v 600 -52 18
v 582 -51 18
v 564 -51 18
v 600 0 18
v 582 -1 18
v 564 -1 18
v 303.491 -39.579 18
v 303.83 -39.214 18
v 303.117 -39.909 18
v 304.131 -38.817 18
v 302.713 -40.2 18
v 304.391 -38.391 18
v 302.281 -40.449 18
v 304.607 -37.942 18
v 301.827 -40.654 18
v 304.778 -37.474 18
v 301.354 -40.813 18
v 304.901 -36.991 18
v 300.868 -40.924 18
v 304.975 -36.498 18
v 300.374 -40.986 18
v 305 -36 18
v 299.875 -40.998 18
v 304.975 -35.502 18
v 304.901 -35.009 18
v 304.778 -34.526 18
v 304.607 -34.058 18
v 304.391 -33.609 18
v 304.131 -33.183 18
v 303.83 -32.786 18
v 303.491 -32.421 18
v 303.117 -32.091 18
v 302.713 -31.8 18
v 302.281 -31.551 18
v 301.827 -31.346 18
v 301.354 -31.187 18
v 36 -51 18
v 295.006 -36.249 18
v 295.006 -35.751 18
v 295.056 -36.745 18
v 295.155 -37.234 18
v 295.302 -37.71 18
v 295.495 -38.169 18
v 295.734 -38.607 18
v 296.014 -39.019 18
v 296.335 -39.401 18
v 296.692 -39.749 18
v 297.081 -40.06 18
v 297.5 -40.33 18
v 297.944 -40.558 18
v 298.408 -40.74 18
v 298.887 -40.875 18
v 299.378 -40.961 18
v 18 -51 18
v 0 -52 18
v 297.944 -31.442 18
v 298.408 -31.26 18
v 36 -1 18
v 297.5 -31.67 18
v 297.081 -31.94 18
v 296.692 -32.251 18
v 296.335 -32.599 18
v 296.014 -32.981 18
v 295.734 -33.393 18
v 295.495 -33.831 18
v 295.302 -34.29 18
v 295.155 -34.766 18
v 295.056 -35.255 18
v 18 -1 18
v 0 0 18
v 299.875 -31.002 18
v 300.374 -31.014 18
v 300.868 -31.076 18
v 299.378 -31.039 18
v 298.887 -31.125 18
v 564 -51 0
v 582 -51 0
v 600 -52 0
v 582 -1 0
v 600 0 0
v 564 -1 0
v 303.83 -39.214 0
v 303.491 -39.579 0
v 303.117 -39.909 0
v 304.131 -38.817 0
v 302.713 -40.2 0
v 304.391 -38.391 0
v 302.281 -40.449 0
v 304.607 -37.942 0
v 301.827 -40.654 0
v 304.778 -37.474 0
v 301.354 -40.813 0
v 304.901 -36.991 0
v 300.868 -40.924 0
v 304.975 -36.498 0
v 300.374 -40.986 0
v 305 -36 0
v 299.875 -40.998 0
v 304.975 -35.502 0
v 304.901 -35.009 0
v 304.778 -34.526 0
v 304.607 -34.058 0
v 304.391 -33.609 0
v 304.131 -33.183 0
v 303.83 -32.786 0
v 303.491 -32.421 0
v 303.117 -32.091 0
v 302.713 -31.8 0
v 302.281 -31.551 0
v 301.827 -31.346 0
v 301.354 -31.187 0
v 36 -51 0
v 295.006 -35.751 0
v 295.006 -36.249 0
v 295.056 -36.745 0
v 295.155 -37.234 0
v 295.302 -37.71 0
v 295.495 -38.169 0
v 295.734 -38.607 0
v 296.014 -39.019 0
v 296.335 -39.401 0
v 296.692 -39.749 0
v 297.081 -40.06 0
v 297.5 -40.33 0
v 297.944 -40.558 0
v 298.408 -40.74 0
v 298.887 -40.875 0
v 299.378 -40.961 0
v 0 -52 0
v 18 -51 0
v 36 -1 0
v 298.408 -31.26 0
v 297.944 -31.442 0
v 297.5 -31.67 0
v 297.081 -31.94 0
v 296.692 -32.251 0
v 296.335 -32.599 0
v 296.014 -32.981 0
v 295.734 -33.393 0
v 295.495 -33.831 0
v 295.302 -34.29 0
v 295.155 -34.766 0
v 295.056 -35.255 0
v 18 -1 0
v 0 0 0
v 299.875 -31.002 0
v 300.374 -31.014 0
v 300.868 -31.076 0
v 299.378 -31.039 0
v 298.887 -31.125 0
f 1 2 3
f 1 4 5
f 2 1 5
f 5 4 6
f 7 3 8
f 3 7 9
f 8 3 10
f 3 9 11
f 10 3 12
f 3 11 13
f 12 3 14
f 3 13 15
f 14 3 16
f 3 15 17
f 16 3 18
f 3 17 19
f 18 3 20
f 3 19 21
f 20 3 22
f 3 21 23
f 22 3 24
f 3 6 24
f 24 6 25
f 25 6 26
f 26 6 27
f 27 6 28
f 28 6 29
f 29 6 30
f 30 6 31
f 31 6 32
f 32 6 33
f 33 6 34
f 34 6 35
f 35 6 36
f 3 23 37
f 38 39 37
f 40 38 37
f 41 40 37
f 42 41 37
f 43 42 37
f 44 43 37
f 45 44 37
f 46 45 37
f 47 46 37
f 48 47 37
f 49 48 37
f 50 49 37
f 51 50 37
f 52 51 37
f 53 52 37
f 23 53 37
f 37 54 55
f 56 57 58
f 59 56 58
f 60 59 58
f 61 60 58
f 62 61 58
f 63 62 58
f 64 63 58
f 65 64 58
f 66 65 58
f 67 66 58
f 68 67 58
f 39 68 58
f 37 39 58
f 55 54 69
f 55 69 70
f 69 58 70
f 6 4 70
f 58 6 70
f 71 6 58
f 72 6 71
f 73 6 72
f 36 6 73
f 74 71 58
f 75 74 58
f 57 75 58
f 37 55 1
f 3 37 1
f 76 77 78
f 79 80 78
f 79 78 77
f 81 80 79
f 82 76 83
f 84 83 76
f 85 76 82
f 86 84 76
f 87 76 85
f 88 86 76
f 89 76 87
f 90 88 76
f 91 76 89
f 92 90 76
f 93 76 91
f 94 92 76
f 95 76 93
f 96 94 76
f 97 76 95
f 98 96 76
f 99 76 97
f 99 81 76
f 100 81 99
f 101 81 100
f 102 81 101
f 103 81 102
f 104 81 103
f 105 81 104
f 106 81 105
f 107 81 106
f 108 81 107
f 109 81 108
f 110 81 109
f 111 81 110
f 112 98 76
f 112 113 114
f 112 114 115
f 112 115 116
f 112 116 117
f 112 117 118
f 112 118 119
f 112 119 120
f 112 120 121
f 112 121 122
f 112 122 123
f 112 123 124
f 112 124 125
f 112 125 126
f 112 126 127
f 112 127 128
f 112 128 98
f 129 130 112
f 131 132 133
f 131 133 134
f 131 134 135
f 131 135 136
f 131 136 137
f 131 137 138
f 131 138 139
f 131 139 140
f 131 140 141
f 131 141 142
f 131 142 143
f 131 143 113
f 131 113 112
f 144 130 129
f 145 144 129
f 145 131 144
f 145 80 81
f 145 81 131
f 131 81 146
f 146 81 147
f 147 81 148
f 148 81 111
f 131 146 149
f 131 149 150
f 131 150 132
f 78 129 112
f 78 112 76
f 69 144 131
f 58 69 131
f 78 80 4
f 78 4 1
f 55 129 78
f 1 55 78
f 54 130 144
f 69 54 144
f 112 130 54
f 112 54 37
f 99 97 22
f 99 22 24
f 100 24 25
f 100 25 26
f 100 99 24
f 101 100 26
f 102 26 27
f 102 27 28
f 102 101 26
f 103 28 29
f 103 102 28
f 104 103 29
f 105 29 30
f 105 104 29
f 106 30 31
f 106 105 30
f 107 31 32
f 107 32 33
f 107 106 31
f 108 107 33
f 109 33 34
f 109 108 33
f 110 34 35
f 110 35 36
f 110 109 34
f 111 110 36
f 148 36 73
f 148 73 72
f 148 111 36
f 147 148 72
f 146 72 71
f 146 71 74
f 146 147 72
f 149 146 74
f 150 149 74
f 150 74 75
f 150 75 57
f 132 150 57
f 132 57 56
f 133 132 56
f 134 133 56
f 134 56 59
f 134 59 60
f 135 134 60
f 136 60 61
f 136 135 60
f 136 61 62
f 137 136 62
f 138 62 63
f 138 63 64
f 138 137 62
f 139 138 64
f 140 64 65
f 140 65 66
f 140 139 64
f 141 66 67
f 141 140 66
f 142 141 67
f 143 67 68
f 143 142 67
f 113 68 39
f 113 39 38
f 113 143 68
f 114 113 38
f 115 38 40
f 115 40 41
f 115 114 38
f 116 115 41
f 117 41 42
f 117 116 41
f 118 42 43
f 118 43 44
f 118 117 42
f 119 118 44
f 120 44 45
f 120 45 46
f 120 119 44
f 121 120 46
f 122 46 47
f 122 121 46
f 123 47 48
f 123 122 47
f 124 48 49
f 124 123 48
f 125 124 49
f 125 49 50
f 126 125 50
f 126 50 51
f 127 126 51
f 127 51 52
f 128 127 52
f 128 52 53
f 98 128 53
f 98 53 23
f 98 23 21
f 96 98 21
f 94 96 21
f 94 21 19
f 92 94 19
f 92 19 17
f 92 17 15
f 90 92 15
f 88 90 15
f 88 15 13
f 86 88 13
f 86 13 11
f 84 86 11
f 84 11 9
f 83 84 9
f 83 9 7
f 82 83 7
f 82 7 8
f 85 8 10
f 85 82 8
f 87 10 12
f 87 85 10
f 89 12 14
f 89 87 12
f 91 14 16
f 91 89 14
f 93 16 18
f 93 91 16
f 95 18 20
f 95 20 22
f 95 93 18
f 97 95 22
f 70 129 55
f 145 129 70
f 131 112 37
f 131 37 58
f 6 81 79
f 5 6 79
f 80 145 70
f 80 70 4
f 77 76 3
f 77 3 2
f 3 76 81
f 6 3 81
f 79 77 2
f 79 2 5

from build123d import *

# Parameters (mm, degrees)
SKETCH1_R           = 5
SKETCH1_W           = 18
SKETCH1_H           = 50
BOSS_EXTRUDE1_DEPTH = 18


with BuildPart() as part:
    # Sketch1 → Boss-Extrude1 (new body)
    with BuildSketch(Plane.XY):
        Polygon((0, 0), (600, 0), (600, -52), (307, -52), (257, -52), (0, -52), align=None)
        with Locations((300, -36)):
            Circle(SKETCH1_R, mode=Mode.SUBTRACT)
        with Locations((573, -26)):
            Rectangle(SKETCH1_W, SKETCH1_H, mode=Mode.SUBTRACT)
        with Locations((27, -26)):
            Rectangle(SKETCH1_W, SKETCH1_H, mode=Mode.SUBTRACT)
    extrude(amount=BOSS_EXTRUDE1_DEPTH)


solid = part.part
